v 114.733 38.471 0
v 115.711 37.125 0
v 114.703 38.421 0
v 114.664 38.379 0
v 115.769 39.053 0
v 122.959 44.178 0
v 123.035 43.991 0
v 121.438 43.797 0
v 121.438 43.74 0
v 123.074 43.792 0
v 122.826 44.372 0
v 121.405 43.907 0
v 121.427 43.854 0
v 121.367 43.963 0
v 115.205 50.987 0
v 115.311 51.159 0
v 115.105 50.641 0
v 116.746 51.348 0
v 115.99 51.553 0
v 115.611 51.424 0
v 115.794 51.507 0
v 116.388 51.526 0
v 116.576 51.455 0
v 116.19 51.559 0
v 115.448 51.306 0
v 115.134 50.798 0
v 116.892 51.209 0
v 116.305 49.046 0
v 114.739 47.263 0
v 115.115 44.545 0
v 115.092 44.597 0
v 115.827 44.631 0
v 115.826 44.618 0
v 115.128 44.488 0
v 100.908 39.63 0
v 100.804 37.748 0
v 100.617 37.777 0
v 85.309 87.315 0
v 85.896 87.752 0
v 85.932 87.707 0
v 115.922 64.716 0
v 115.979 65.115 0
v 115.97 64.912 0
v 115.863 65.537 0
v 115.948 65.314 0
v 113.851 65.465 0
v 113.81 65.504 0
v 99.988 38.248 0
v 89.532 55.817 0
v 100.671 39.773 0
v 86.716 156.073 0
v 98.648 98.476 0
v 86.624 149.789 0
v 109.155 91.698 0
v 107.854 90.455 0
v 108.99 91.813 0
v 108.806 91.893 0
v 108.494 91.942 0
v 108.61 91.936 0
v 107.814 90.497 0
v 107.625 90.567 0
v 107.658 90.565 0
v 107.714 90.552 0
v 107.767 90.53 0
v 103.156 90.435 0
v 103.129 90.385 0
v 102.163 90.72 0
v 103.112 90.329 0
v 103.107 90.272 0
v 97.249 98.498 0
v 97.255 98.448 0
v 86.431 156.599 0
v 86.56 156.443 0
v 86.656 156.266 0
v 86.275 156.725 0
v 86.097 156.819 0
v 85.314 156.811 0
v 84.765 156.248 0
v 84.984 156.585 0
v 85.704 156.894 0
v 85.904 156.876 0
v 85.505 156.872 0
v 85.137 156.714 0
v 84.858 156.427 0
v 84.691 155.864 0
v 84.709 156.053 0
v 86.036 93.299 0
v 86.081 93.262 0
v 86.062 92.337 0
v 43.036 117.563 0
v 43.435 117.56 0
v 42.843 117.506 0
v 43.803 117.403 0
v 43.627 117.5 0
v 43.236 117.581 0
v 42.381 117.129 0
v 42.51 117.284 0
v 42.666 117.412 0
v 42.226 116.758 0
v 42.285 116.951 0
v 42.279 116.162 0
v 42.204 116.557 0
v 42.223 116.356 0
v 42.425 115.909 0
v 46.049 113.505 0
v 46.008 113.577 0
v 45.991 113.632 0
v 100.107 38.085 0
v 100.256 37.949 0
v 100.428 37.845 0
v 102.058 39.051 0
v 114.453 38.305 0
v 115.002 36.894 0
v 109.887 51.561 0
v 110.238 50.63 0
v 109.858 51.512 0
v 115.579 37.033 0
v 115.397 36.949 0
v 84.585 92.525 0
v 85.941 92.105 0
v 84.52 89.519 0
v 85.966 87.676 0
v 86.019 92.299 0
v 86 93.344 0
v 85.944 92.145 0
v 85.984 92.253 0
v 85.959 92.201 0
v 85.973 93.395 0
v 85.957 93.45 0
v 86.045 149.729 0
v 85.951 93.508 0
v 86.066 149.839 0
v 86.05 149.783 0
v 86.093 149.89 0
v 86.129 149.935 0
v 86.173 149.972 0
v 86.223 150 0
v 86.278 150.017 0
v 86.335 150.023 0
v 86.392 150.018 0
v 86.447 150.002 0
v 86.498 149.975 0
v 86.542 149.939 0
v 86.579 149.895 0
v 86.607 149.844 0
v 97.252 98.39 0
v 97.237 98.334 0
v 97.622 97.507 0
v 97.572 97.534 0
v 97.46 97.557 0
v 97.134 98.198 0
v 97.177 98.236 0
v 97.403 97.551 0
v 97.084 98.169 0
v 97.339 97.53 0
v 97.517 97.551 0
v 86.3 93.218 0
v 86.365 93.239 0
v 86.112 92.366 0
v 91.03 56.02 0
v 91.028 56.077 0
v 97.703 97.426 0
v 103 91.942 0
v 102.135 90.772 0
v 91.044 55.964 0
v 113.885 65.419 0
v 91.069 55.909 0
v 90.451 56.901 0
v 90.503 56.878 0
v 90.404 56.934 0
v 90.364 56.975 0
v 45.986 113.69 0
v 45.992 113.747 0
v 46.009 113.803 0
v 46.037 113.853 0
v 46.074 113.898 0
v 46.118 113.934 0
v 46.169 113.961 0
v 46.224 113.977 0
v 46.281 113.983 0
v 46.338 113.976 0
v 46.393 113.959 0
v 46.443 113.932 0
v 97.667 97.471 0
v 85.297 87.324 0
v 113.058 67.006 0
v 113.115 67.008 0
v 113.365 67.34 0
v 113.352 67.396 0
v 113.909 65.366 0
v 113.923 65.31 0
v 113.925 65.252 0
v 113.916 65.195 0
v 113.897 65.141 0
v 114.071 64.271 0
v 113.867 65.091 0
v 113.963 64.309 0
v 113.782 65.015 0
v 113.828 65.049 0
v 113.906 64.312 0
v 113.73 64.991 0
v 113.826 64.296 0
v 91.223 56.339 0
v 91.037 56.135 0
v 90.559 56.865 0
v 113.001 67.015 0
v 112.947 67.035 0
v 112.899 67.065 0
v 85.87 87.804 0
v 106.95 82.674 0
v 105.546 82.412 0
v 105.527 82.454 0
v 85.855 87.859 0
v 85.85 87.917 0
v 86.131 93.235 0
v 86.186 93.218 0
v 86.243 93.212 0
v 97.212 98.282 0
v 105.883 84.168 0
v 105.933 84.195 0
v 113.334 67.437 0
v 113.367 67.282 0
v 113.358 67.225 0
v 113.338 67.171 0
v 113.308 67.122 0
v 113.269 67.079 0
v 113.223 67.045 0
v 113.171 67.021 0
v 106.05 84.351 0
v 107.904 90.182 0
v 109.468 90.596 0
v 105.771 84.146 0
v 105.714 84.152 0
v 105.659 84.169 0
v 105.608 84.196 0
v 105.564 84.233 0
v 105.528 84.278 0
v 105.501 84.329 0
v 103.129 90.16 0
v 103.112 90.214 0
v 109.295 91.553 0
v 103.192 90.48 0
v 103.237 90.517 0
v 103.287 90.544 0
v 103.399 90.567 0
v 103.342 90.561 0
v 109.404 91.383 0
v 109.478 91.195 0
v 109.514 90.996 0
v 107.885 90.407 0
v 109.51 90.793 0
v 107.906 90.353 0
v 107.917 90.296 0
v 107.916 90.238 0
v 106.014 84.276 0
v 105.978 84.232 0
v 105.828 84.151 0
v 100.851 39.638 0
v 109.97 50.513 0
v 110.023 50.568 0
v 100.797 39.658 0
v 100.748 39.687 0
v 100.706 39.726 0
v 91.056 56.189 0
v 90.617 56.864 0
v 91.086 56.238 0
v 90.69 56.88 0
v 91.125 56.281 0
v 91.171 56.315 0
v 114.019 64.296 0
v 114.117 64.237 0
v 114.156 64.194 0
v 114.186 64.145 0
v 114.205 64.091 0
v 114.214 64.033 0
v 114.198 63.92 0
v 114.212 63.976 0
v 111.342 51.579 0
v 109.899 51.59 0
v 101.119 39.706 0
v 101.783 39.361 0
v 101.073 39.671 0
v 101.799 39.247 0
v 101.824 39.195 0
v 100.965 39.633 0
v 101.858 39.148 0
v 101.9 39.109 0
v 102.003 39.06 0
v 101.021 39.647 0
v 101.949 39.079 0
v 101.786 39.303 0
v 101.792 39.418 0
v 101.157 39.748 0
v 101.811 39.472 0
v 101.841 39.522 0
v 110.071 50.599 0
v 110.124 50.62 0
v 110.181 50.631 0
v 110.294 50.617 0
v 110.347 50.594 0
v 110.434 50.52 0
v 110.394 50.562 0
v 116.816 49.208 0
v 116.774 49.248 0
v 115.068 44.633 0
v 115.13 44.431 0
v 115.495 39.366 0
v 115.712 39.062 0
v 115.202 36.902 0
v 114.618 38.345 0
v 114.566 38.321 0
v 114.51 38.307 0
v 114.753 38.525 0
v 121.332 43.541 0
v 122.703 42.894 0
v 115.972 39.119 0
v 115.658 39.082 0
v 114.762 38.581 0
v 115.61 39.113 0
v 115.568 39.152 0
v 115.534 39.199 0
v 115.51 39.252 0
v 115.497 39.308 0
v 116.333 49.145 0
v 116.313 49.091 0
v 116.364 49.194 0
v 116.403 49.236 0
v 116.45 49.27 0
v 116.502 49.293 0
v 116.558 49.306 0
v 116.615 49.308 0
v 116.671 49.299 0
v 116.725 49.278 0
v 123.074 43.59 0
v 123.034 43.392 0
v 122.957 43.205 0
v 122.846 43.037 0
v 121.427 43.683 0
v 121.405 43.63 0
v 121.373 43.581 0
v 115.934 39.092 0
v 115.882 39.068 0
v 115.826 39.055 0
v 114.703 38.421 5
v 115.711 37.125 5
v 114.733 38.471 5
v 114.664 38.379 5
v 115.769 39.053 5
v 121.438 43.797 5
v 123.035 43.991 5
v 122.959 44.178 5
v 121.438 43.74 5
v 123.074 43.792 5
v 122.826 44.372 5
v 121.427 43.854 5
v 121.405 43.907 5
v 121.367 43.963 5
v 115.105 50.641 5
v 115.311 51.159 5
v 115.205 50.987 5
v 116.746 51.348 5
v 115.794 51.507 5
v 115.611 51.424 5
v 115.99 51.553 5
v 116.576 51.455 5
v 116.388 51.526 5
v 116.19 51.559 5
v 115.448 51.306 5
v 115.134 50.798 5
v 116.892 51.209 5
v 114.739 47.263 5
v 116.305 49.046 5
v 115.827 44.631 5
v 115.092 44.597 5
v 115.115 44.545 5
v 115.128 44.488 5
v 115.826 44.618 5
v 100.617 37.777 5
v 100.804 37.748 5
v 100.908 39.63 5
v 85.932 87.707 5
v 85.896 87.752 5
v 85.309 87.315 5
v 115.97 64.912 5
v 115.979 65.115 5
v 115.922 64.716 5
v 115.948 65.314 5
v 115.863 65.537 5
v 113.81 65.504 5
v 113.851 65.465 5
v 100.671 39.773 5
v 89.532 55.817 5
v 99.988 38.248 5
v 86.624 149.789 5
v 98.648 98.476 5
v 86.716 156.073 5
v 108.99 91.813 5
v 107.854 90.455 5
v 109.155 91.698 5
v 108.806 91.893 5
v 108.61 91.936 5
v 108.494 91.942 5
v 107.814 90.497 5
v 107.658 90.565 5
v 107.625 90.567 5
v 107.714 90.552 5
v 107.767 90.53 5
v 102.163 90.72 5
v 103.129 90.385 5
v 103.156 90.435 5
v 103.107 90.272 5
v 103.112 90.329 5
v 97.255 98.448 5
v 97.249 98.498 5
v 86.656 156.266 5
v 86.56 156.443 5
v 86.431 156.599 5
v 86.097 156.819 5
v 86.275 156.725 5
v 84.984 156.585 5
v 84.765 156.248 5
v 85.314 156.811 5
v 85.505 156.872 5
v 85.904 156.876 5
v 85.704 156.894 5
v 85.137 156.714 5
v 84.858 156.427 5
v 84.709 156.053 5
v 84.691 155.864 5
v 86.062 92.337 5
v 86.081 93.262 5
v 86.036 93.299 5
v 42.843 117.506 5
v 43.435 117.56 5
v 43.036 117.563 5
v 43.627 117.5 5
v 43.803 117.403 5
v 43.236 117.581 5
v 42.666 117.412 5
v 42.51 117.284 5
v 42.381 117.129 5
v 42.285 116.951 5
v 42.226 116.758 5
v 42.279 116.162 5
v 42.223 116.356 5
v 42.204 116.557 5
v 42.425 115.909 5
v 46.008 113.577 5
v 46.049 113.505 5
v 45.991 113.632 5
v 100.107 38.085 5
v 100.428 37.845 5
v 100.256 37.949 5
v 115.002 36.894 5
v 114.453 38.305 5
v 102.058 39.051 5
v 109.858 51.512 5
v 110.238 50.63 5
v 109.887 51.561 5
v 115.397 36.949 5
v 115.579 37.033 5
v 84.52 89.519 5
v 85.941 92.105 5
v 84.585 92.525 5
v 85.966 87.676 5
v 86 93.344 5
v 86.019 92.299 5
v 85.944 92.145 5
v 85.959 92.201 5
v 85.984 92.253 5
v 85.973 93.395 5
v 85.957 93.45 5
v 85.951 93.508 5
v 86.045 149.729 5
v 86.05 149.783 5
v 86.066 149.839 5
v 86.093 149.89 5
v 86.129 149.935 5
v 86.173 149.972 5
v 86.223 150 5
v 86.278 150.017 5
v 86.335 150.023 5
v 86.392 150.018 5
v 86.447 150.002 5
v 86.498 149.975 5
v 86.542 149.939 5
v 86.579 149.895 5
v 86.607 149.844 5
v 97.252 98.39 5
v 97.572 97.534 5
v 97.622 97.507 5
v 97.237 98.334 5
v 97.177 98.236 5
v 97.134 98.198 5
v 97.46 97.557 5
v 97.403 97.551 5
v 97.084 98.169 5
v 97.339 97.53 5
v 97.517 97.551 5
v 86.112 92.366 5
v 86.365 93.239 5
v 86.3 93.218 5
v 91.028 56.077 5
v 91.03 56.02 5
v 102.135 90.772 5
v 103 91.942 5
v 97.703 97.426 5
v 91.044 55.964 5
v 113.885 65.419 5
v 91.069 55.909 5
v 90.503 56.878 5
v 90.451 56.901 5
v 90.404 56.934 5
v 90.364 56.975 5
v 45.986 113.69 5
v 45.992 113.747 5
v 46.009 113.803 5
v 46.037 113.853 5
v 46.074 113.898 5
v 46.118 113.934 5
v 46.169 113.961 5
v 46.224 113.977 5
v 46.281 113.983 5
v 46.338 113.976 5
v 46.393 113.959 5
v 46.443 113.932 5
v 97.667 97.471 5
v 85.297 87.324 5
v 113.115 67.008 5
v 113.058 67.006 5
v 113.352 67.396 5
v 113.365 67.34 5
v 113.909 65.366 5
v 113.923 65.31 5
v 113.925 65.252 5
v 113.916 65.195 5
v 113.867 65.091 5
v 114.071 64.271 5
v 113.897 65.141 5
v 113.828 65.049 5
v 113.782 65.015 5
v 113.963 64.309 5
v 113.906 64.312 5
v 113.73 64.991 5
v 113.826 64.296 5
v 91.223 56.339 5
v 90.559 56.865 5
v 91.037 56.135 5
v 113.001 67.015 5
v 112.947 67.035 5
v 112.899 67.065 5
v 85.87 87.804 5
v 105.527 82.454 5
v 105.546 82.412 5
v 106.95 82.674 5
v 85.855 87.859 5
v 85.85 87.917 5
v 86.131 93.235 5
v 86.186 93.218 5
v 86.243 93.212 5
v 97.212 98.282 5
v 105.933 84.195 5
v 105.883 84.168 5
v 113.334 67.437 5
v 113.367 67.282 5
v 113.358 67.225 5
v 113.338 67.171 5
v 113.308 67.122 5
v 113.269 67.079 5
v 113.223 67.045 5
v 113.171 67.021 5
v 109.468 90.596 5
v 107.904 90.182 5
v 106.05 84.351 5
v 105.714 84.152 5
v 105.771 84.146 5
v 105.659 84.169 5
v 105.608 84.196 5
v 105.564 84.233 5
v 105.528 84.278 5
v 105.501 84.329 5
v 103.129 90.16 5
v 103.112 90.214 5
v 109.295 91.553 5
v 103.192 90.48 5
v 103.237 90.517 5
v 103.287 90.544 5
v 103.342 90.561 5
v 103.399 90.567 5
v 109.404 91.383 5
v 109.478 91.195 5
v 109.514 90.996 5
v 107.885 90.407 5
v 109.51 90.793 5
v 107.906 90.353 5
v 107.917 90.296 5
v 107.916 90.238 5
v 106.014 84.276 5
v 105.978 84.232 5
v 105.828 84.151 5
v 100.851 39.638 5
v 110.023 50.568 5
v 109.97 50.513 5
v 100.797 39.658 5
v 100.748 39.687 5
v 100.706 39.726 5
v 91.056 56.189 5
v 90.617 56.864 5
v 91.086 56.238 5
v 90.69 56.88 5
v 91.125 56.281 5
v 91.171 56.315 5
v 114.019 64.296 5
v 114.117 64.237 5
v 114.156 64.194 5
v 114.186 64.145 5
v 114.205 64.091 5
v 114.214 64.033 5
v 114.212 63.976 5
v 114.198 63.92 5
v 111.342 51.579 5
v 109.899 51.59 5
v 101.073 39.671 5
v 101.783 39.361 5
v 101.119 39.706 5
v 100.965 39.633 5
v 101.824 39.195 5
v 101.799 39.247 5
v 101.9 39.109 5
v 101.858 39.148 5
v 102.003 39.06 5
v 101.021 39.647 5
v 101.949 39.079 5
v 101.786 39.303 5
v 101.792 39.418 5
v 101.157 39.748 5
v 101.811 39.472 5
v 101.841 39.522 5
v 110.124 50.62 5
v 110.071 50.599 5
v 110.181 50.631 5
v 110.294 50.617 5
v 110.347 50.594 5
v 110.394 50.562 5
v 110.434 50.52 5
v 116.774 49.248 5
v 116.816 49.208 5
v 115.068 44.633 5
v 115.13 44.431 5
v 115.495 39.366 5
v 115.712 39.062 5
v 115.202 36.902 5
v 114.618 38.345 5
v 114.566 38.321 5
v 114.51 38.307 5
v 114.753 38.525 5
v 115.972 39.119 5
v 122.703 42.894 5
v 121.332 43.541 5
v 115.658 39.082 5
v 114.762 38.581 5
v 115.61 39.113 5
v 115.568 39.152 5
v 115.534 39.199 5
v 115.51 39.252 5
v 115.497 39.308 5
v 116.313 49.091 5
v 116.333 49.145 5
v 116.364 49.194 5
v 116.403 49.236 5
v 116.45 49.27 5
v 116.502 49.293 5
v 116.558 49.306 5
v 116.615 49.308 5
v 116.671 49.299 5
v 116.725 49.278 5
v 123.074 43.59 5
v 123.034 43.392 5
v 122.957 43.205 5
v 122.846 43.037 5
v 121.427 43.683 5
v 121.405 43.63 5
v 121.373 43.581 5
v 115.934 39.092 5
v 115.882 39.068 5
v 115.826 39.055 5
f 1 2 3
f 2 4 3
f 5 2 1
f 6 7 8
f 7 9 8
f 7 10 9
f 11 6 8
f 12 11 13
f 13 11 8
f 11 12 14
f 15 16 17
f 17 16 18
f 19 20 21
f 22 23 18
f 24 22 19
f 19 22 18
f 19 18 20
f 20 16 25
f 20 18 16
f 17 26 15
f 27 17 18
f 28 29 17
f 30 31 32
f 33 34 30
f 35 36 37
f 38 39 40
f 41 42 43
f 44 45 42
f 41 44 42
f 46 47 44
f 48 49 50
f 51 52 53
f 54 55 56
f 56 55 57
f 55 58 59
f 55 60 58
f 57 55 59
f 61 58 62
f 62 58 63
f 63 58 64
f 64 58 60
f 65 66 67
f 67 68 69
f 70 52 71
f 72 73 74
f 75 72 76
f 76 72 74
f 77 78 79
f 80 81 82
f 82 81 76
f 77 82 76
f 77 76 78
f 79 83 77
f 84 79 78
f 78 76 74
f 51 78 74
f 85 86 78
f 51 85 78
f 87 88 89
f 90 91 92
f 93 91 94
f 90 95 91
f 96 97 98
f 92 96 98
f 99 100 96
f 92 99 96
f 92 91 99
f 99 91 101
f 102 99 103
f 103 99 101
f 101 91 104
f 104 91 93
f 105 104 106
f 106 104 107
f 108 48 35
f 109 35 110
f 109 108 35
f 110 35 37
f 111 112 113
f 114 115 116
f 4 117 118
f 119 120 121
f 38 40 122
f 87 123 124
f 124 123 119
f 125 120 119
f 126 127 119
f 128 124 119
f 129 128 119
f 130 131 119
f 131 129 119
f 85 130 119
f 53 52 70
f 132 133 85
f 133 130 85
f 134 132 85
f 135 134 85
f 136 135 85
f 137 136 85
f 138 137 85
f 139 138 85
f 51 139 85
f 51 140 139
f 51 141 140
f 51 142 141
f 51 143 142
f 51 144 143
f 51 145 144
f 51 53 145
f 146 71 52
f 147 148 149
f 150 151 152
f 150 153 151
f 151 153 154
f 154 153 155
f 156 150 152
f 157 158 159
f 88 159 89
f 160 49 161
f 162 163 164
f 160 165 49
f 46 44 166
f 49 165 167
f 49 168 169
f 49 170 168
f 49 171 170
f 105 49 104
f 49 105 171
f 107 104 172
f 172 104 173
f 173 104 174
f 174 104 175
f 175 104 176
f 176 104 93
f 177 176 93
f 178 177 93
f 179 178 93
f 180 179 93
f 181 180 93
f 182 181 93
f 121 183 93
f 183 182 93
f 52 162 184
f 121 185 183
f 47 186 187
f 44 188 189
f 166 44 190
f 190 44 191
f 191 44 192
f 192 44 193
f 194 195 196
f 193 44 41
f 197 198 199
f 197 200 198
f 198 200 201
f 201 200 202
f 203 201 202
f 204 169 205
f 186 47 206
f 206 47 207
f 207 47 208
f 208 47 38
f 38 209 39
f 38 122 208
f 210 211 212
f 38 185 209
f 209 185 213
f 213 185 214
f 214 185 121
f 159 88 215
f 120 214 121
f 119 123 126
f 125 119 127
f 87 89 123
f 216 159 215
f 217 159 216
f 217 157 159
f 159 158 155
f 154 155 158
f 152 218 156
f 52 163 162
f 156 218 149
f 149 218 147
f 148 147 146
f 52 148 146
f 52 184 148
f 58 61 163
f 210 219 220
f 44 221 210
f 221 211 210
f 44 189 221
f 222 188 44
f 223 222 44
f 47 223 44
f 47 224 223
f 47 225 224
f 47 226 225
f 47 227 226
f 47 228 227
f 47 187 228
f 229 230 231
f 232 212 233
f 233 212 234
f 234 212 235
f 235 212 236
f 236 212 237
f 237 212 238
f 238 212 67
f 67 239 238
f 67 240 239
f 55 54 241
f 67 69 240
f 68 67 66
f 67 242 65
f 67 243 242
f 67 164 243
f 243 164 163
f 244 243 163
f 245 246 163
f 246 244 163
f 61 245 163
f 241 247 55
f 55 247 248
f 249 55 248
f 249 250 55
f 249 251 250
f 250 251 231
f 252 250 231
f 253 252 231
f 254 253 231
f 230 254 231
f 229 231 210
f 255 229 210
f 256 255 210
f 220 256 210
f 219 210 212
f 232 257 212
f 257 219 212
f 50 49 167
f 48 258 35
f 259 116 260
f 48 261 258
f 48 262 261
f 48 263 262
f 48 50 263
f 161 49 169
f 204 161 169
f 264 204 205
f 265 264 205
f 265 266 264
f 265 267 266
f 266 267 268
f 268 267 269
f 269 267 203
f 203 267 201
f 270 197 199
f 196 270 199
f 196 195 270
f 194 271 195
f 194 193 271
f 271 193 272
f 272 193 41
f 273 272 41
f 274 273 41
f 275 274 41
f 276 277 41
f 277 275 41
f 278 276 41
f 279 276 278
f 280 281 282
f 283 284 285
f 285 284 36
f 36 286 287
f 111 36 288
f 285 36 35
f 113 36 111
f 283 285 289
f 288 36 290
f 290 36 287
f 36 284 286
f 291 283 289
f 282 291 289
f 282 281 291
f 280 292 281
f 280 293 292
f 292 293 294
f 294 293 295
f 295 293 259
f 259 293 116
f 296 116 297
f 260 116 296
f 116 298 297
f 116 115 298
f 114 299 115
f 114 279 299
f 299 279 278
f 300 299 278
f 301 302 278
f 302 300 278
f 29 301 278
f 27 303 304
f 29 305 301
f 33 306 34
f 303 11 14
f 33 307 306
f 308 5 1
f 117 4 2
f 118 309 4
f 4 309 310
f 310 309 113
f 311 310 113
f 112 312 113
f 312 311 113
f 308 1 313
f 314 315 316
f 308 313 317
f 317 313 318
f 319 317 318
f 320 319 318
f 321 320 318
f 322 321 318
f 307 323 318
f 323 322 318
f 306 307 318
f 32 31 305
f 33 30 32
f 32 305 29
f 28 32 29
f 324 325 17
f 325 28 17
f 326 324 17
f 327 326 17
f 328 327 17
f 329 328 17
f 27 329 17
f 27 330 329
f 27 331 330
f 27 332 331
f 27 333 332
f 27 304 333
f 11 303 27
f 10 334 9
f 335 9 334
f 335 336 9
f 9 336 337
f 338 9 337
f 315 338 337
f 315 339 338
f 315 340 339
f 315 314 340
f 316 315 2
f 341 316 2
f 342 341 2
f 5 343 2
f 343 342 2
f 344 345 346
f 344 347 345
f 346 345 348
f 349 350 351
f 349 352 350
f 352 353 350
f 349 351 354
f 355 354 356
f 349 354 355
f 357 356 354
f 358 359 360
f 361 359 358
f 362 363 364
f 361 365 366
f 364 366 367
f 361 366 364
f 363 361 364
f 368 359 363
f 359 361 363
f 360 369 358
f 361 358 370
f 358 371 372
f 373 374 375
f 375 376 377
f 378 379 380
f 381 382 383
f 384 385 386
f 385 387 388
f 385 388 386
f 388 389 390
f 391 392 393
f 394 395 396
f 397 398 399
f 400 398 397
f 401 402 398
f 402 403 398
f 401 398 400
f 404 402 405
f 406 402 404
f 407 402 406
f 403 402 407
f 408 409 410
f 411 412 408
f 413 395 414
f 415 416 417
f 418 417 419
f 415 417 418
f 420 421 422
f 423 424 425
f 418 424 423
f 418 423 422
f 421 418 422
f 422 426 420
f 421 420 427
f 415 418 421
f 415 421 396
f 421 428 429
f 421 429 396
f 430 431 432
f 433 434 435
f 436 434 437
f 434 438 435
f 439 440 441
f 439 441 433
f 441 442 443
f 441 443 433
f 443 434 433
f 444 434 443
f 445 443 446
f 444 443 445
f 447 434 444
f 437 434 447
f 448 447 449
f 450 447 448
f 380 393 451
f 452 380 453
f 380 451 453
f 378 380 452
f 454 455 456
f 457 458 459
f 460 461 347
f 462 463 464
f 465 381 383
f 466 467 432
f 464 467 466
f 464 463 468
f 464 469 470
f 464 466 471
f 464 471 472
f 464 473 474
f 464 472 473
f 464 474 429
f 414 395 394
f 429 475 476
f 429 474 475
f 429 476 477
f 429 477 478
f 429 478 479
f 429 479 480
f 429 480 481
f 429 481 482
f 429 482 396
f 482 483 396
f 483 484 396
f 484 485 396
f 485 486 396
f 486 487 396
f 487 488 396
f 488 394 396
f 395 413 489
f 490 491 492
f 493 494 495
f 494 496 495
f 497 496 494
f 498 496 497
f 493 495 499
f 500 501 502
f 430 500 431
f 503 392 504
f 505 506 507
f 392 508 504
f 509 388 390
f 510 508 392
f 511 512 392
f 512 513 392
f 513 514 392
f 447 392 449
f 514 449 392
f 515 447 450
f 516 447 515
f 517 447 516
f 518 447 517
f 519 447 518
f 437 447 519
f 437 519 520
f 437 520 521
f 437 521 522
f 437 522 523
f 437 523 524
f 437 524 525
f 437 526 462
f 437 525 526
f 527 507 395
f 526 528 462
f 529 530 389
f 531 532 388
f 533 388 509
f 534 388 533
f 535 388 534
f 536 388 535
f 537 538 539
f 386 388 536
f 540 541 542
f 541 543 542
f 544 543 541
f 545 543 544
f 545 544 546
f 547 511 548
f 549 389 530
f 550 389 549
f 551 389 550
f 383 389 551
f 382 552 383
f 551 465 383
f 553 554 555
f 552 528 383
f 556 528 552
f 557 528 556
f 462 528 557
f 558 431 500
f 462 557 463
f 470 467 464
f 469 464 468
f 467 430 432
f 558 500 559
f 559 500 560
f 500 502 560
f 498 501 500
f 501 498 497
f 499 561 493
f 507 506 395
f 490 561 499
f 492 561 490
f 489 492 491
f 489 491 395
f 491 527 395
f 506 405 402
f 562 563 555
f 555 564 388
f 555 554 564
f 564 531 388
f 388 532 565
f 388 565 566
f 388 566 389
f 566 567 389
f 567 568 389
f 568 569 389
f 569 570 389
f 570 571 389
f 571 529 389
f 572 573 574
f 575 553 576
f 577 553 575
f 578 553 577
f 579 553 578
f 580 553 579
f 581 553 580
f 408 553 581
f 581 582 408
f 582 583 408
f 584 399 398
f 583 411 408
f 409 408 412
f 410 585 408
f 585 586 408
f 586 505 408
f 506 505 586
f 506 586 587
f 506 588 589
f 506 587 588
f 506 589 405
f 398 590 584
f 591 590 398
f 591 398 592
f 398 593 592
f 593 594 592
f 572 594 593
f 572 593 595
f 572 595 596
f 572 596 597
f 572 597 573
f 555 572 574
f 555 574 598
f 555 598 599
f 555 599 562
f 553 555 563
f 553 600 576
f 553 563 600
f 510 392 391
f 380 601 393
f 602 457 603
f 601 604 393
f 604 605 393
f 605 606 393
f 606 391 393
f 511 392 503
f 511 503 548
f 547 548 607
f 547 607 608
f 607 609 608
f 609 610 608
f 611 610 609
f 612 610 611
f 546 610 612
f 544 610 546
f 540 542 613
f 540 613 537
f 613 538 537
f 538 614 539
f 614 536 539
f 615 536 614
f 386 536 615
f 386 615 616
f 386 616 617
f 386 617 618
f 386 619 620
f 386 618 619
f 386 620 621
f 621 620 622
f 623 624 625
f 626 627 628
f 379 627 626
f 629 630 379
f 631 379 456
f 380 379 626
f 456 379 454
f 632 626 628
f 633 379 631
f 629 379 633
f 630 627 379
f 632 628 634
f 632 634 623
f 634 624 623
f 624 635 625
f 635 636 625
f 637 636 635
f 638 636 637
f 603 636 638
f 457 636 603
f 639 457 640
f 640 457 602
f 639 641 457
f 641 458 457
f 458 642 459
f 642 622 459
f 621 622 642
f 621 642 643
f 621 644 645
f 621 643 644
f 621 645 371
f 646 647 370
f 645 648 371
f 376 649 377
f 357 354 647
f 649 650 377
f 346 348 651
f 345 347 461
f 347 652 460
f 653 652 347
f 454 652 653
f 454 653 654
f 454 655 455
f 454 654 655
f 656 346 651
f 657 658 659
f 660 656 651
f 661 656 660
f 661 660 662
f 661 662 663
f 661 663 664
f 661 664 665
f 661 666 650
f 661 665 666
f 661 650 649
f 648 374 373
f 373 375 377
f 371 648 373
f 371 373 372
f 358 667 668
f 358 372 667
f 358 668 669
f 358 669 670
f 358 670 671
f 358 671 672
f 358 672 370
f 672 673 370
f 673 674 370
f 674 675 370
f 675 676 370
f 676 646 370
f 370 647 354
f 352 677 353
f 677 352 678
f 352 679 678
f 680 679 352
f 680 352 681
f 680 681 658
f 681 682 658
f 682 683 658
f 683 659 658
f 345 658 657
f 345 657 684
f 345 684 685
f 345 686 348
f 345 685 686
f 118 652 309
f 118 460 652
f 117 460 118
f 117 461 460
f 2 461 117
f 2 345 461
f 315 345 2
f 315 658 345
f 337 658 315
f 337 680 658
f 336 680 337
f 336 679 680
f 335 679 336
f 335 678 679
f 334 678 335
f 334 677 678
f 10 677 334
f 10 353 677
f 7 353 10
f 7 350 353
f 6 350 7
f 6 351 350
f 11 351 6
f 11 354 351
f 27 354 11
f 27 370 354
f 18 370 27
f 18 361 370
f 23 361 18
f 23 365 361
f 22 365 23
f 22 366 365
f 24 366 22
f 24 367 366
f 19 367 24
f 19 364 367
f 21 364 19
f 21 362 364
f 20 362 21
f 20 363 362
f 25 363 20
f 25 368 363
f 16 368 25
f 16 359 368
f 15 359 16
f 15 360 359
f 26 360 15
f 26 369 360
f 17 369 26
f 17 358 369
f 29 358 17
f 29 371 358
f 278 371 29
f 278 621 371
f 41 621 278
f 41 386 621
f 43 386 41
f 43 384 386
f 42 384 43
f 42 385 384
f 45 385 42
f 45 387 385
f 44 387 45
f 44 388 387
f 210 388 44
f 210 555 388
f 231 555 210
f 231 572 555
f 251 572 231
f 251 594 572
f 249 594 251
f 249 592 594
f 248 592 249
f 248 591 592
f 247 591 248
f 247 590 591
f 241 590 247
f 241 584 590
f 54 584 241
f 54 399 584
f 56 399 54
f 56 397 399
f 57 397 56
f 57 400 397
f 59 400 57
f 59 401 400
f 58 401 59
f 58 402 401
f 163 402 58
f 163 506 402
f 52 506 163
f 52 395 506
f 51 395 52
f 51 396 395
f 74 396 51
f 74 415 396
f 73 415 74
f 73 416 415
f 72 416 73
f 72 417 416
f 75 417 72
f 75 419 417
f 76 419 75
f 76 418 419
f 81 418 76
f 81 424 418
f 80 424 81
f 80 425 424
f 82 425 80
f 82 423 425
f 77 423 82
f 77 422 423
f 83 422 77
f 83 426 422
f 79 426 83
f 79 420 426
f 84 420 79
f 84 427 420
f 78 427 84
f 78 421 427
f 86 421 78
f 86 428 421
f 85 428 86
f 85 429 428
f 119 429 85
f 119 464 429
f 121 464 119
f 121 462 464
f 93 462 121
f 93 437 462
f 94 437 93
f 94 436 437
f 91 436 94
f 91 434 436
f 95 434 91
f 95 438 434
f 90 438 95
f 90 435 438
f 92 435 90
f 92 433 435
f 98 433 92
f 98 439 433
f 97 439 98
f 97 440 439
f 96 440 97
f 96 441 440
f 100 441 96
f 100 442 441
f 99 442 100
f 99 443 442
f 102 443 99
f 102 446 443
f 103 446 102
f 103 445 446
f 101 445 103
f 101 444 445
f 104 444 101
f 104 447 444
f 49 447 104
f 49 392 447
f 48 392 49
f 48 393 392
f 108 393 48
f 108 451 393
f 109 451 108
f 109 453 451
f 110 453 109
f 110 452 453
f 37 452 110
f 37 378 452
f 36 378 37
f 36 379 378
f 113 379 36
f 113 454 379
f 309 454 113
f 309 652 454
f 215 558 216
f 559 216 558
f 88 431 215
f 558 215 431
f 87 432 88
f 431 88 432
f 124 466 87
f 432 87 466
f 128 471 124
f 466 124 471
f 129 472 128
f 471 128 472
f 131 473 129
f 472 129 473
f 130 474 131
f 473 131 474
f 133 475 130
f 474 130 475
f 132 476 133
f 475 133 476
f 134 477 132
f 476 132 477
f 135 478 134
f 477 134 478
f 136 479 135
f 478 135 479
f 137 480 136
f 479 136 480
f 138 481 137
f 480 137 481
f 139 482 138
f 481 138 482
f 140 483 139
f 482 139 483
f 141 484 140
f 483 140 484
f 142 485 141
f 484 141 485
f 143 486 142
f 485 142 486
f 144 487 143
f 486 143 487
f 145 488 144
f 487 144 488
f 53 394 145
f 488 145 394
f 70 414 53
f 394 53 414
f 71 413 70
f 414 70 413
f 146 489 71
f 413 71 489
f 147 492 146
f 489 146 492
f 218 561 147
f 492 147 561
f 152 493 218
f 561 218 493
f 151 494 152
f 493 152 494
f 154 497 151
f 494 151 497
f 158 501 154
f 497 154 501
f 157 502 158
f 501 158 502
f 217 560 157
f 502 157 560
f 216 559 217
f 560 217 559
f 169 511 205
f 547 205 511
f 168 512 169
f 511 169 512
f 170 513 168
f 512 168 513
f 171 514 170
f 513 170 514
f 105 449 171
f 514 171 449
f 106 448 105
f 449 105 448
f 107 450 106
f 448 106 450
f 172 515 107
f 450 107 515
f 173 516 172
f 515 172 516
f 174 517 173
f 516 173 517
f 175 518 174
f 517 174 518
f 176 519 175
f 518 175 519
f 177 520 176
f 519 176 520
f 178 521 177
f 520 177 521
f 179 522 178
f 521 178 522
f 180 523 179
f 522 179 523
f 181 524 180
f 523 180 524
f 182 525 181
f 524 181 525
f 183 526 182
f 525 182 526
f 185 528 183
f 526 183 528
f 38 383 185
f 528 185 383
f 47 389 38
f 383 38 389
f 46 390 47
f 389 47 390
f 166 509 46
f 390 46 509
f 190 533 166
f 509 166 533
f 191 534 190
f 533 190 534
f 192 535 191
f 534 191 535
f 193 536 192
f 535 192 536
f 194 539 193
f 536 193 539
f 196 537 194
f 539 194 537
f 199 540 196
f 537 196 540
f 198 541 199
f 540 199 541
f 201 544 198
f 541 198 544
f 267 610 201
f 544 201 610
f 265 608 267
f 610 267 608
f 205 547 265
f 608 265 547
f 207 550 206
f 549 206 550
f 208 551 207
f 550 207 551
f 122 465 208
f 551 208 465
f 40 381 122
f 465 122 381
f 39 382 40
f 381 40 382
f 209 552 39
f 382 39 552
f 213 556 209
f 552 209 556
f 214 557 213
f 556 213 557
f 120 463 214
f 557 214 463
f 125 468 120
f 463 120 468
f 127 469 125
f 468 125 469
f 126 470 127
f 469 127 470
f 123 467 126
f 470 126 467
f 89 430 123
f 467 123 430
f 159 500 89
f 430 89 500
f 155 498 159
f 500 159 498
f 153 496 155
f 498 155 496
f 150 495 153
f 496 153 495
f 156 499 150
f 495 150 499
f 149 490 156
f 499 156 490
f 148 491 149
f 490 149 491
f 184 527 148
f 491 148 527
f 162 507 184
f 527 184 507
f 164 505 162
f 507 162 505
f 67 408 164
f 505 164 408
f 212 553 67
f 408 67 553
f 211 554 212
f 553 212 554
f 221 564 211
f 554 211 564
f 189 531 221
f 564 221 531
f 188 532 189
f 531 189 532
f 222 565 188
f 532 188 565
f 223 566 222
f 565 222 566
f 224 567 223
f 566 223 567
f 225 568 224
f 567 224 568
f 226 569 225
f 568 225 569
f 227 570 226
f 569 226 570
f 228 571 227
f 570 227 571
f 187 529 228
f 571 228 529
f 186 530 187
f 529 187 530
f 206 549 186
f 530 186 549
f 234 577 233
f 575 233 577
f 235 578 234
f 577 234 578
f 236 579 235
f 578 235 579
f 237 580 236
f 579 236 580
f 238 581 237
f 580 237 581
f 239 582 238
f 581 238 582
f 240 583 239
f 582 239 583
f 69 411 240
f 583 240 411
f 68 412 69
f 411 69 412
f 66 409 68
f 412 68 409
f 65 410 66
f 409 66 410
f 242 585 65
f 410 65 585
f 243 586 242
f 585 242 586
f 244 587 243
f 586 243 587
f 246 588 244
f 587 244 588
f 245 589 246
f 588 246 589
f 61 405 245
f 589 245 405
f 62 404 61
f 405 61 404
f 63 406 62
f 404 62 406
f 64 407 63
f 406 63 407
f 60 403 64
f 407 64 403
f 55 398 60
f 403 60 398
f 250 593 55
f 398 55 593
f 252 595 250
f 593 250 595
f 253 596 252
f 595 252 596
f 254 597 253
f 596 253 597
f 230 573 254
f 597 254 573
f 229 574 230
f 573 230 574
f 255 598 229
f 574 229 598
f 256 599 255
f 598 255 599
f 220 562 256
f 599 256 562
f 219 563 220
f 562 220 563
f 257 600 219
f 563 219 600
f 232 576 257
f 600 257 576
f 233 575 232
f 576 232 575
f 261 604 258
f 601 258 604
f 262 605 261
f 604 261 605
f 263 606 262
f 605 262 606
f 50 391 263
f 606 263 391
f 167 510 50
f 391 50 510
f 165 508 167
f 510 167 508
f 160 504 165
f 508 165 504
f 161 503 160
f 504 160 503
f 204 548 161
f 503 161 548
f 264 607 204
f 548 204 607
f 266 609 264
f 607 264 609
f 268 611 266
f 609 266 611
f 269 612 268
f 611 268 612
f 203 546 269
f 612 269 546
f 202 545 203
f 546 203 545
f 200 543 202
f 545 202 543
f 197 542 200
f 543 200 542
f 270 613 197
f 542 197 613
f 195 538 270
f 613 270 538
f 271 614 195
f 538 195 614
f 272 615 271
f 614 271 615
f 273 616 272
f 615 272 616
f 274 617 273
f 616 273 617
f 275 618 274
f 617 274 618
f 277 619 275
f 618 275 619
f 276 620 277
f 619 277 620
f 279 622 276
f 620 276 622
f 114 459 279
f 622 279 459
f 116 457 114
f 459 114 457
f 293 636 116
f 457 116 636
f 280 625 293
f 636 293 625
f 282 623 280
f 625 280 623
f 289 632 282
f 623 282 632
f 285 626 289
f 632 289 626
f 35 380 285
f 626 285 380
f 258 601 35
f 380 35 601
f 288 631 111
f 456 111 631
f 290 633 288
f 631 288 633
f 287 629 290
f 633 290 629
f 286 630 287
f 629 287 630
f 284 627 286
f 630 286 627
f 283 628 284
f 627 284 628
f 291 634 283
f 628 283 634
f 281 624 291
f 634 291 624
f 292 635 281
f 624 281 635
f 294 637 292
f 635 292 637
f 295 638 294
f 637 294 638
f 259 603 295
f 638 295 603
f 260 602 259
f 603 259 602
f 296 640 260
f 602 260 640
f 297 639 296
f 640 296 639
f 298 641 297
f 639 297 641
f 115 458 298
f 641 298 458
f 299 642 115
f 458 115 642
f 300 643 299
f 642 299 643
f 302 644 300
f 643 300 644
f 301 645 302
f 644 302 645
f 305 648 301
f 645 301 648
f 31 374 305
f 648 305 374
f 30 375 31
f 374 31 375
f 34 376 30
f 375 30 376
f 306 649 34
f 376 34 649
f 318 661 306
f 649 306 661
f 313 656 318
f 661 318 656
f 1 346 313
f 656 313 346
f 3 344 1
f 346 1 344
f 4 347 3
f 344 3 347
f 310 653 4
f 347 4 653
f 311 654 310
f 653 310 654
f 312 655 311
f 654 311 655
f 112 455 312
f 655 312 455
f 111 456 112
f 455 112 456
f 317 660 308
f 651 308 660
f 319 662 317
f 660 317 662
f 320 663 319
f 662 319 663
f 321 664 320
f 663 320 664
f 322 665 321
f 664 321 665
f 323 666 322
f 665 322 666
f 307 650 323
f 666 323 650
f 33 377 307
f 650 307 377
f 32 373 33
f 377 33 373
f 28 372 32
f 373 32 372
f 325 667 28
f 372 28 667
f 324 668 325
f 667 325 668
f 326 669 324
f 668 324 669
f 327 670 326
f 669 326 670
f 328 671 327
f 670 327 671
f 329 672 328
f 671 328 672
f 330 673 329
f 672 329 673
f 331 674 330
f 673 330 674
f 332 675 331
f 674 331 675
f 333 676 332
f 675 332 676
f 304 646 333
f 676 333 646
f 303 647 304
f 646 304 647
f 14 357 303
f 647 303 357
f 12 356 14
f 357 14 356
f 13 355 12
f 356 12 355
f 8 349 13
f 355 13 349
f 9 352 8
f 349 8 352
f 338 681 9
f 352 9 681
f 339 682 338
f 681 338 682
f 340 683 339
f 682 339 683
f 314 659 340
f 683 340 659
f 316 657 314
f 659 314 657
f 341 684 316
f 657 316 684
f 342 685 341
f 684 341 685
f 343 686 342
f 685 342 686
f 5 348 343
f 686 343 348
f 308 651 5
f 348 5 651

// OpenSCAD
/*
 * Customizable Origami - Parrot - https://www.thingiverse.com/thing:2716602
 * by Dennis Hofmann - https://www.thingiverse.com/mightynozzle/about
 * created 2017-12-15
 * version v1.0
 *
 * Changelog
 * --------------
 * v1.0:
 *      - final design
 * --------------
 * 
 * This work is licensed under the Creative Commons - Attribution - NonCommercial - ShareAlike license.
 * https://creativecommons.org/licenses/by-nc-sa/3.0/
 */


 // Parameter Section //
//-------------------//

// preview[view:north, tilt:top]

// The maximum size of the longest side. The shorter side will be automatically resized in same ratio.
max_size_in_millimeter = 120; //[20:300]

// The height of the model.
model_height_in_millimeter = 5; //[0.2:0.2:100]

// Thickness of the outer outline.
outline_size_in_millimeter = 1.4; //[0.5:0.1:20]

// Thickness of the inner outline.
inline_size_in_millimeter = 0.7; //[0.5:0.1:20]

// Roundiness of the ends of the inner outlines.
inline_edge_radius_in_millimeter = 0.3; //[0.0:0.1:5]

// Flip model
flip_model = "no"; //[yes,no]

/*[hidden]*/
max_size = max_size_in_millimeter;
model_height = model_height_in_millimeter;
$fn=32;

// Outer Points
A1 = [408, 1091];
A2 = [853, 528];
A3 = [952, 363];
A4 = [1086, 355];
A5 = [1152, 409];
A6 = [1096, 473];
A7 = [1090, 418];
A8 = [1040, 481];
A9 = [1085, 609];
A10 = [999, 773];
A11 = [1024, 851];
A12 = [967, 851];
A13 = [922, 918];
A14 = [809, 1459];
A15 = [808, 866];
A16 = [807, 820];

outline = [A1, A2, A3, A4, A5, A6, A7, A8, A9, A10, A11, A12, A13, A14, A15, A16];

// Inner Points

// Polygons
C1 = [A4, A7, A6, A5];
C2 = [A3, A8, A7, A4];
C3 = [A3, A8, A9, A2];
C4 = [A2, A1, A16, A9];
C5 = [A16, A15, A13, A12, A10, A9];
C6 = [A10, A11, A12];
C7 = [A13, A14, A15];

cut_polygons = [C1, C2, C3, C4, C5, C6, C7];

min_x = A1[0];
min_y = A4[1];
max_x = A5[0];
max_y = A14[1];

x_size = max_x - min_x;
y_size = max_y - min_y;

x_factor = max_size / x_size;
y_factor = max_size / y_size;

inline_size = x_size > y_size ? inline_size_in_millimeter / x_factor / 2: inline_size_in_millimeter / y_factor / 2;
inline_edge_radius = x_size > y_size ? inline_edge_radius_in_millimeter / x_factor: inline_edge_radius_in_millimeter / y_factor;
outline_size = x_size > y_size ? outline_size_in_millimeter / x_factor - inline_size: outline_size_in_millimeter / y_factor - inline_size;


 // Program Section //
//-----------------//

if(x_size > y_size) {
    resize(newsize=[max_size, x_factor * y_size, model_height]){
        if(flip_model == "yes") {
            mirror([0,1,0]) {
                rotate([180,180,0]) {    
                    create(outline, cut_polygons);
                }
            }
        } else {
            create(outline, cut_polygons);
        }
    }
} else {
    resize(newsize=[y_factor * x_size, max_size, model_height]){
        if(flip_model == "yes") {
            mirror([0,1,0]) {
                rotate([180,180,0]) {    
                    create(outline, cut_polygons);
                }
            }
        } else {
            create(outline, cut_polygons);
        }
    }
}


 // Module Section //
//----------------//

module create() {
    linear_extrude(height=1) {
        difference() {
            offset(r = -0) {
                offset(r = +outline_size) {
                    polygon(points = outline, convexity = 10);
                }
            }
            
            for(cut_polygon = [0:len(cut_polygons)]) {
                offset(r = +inline_edge_radius) {
                    offset(r = -inline_size - inline_edge_radius) {
                        polygon(points = cut_polygons[cut_polygon], convexity = 10);
                    }
                }
            }
        }
    }
}
